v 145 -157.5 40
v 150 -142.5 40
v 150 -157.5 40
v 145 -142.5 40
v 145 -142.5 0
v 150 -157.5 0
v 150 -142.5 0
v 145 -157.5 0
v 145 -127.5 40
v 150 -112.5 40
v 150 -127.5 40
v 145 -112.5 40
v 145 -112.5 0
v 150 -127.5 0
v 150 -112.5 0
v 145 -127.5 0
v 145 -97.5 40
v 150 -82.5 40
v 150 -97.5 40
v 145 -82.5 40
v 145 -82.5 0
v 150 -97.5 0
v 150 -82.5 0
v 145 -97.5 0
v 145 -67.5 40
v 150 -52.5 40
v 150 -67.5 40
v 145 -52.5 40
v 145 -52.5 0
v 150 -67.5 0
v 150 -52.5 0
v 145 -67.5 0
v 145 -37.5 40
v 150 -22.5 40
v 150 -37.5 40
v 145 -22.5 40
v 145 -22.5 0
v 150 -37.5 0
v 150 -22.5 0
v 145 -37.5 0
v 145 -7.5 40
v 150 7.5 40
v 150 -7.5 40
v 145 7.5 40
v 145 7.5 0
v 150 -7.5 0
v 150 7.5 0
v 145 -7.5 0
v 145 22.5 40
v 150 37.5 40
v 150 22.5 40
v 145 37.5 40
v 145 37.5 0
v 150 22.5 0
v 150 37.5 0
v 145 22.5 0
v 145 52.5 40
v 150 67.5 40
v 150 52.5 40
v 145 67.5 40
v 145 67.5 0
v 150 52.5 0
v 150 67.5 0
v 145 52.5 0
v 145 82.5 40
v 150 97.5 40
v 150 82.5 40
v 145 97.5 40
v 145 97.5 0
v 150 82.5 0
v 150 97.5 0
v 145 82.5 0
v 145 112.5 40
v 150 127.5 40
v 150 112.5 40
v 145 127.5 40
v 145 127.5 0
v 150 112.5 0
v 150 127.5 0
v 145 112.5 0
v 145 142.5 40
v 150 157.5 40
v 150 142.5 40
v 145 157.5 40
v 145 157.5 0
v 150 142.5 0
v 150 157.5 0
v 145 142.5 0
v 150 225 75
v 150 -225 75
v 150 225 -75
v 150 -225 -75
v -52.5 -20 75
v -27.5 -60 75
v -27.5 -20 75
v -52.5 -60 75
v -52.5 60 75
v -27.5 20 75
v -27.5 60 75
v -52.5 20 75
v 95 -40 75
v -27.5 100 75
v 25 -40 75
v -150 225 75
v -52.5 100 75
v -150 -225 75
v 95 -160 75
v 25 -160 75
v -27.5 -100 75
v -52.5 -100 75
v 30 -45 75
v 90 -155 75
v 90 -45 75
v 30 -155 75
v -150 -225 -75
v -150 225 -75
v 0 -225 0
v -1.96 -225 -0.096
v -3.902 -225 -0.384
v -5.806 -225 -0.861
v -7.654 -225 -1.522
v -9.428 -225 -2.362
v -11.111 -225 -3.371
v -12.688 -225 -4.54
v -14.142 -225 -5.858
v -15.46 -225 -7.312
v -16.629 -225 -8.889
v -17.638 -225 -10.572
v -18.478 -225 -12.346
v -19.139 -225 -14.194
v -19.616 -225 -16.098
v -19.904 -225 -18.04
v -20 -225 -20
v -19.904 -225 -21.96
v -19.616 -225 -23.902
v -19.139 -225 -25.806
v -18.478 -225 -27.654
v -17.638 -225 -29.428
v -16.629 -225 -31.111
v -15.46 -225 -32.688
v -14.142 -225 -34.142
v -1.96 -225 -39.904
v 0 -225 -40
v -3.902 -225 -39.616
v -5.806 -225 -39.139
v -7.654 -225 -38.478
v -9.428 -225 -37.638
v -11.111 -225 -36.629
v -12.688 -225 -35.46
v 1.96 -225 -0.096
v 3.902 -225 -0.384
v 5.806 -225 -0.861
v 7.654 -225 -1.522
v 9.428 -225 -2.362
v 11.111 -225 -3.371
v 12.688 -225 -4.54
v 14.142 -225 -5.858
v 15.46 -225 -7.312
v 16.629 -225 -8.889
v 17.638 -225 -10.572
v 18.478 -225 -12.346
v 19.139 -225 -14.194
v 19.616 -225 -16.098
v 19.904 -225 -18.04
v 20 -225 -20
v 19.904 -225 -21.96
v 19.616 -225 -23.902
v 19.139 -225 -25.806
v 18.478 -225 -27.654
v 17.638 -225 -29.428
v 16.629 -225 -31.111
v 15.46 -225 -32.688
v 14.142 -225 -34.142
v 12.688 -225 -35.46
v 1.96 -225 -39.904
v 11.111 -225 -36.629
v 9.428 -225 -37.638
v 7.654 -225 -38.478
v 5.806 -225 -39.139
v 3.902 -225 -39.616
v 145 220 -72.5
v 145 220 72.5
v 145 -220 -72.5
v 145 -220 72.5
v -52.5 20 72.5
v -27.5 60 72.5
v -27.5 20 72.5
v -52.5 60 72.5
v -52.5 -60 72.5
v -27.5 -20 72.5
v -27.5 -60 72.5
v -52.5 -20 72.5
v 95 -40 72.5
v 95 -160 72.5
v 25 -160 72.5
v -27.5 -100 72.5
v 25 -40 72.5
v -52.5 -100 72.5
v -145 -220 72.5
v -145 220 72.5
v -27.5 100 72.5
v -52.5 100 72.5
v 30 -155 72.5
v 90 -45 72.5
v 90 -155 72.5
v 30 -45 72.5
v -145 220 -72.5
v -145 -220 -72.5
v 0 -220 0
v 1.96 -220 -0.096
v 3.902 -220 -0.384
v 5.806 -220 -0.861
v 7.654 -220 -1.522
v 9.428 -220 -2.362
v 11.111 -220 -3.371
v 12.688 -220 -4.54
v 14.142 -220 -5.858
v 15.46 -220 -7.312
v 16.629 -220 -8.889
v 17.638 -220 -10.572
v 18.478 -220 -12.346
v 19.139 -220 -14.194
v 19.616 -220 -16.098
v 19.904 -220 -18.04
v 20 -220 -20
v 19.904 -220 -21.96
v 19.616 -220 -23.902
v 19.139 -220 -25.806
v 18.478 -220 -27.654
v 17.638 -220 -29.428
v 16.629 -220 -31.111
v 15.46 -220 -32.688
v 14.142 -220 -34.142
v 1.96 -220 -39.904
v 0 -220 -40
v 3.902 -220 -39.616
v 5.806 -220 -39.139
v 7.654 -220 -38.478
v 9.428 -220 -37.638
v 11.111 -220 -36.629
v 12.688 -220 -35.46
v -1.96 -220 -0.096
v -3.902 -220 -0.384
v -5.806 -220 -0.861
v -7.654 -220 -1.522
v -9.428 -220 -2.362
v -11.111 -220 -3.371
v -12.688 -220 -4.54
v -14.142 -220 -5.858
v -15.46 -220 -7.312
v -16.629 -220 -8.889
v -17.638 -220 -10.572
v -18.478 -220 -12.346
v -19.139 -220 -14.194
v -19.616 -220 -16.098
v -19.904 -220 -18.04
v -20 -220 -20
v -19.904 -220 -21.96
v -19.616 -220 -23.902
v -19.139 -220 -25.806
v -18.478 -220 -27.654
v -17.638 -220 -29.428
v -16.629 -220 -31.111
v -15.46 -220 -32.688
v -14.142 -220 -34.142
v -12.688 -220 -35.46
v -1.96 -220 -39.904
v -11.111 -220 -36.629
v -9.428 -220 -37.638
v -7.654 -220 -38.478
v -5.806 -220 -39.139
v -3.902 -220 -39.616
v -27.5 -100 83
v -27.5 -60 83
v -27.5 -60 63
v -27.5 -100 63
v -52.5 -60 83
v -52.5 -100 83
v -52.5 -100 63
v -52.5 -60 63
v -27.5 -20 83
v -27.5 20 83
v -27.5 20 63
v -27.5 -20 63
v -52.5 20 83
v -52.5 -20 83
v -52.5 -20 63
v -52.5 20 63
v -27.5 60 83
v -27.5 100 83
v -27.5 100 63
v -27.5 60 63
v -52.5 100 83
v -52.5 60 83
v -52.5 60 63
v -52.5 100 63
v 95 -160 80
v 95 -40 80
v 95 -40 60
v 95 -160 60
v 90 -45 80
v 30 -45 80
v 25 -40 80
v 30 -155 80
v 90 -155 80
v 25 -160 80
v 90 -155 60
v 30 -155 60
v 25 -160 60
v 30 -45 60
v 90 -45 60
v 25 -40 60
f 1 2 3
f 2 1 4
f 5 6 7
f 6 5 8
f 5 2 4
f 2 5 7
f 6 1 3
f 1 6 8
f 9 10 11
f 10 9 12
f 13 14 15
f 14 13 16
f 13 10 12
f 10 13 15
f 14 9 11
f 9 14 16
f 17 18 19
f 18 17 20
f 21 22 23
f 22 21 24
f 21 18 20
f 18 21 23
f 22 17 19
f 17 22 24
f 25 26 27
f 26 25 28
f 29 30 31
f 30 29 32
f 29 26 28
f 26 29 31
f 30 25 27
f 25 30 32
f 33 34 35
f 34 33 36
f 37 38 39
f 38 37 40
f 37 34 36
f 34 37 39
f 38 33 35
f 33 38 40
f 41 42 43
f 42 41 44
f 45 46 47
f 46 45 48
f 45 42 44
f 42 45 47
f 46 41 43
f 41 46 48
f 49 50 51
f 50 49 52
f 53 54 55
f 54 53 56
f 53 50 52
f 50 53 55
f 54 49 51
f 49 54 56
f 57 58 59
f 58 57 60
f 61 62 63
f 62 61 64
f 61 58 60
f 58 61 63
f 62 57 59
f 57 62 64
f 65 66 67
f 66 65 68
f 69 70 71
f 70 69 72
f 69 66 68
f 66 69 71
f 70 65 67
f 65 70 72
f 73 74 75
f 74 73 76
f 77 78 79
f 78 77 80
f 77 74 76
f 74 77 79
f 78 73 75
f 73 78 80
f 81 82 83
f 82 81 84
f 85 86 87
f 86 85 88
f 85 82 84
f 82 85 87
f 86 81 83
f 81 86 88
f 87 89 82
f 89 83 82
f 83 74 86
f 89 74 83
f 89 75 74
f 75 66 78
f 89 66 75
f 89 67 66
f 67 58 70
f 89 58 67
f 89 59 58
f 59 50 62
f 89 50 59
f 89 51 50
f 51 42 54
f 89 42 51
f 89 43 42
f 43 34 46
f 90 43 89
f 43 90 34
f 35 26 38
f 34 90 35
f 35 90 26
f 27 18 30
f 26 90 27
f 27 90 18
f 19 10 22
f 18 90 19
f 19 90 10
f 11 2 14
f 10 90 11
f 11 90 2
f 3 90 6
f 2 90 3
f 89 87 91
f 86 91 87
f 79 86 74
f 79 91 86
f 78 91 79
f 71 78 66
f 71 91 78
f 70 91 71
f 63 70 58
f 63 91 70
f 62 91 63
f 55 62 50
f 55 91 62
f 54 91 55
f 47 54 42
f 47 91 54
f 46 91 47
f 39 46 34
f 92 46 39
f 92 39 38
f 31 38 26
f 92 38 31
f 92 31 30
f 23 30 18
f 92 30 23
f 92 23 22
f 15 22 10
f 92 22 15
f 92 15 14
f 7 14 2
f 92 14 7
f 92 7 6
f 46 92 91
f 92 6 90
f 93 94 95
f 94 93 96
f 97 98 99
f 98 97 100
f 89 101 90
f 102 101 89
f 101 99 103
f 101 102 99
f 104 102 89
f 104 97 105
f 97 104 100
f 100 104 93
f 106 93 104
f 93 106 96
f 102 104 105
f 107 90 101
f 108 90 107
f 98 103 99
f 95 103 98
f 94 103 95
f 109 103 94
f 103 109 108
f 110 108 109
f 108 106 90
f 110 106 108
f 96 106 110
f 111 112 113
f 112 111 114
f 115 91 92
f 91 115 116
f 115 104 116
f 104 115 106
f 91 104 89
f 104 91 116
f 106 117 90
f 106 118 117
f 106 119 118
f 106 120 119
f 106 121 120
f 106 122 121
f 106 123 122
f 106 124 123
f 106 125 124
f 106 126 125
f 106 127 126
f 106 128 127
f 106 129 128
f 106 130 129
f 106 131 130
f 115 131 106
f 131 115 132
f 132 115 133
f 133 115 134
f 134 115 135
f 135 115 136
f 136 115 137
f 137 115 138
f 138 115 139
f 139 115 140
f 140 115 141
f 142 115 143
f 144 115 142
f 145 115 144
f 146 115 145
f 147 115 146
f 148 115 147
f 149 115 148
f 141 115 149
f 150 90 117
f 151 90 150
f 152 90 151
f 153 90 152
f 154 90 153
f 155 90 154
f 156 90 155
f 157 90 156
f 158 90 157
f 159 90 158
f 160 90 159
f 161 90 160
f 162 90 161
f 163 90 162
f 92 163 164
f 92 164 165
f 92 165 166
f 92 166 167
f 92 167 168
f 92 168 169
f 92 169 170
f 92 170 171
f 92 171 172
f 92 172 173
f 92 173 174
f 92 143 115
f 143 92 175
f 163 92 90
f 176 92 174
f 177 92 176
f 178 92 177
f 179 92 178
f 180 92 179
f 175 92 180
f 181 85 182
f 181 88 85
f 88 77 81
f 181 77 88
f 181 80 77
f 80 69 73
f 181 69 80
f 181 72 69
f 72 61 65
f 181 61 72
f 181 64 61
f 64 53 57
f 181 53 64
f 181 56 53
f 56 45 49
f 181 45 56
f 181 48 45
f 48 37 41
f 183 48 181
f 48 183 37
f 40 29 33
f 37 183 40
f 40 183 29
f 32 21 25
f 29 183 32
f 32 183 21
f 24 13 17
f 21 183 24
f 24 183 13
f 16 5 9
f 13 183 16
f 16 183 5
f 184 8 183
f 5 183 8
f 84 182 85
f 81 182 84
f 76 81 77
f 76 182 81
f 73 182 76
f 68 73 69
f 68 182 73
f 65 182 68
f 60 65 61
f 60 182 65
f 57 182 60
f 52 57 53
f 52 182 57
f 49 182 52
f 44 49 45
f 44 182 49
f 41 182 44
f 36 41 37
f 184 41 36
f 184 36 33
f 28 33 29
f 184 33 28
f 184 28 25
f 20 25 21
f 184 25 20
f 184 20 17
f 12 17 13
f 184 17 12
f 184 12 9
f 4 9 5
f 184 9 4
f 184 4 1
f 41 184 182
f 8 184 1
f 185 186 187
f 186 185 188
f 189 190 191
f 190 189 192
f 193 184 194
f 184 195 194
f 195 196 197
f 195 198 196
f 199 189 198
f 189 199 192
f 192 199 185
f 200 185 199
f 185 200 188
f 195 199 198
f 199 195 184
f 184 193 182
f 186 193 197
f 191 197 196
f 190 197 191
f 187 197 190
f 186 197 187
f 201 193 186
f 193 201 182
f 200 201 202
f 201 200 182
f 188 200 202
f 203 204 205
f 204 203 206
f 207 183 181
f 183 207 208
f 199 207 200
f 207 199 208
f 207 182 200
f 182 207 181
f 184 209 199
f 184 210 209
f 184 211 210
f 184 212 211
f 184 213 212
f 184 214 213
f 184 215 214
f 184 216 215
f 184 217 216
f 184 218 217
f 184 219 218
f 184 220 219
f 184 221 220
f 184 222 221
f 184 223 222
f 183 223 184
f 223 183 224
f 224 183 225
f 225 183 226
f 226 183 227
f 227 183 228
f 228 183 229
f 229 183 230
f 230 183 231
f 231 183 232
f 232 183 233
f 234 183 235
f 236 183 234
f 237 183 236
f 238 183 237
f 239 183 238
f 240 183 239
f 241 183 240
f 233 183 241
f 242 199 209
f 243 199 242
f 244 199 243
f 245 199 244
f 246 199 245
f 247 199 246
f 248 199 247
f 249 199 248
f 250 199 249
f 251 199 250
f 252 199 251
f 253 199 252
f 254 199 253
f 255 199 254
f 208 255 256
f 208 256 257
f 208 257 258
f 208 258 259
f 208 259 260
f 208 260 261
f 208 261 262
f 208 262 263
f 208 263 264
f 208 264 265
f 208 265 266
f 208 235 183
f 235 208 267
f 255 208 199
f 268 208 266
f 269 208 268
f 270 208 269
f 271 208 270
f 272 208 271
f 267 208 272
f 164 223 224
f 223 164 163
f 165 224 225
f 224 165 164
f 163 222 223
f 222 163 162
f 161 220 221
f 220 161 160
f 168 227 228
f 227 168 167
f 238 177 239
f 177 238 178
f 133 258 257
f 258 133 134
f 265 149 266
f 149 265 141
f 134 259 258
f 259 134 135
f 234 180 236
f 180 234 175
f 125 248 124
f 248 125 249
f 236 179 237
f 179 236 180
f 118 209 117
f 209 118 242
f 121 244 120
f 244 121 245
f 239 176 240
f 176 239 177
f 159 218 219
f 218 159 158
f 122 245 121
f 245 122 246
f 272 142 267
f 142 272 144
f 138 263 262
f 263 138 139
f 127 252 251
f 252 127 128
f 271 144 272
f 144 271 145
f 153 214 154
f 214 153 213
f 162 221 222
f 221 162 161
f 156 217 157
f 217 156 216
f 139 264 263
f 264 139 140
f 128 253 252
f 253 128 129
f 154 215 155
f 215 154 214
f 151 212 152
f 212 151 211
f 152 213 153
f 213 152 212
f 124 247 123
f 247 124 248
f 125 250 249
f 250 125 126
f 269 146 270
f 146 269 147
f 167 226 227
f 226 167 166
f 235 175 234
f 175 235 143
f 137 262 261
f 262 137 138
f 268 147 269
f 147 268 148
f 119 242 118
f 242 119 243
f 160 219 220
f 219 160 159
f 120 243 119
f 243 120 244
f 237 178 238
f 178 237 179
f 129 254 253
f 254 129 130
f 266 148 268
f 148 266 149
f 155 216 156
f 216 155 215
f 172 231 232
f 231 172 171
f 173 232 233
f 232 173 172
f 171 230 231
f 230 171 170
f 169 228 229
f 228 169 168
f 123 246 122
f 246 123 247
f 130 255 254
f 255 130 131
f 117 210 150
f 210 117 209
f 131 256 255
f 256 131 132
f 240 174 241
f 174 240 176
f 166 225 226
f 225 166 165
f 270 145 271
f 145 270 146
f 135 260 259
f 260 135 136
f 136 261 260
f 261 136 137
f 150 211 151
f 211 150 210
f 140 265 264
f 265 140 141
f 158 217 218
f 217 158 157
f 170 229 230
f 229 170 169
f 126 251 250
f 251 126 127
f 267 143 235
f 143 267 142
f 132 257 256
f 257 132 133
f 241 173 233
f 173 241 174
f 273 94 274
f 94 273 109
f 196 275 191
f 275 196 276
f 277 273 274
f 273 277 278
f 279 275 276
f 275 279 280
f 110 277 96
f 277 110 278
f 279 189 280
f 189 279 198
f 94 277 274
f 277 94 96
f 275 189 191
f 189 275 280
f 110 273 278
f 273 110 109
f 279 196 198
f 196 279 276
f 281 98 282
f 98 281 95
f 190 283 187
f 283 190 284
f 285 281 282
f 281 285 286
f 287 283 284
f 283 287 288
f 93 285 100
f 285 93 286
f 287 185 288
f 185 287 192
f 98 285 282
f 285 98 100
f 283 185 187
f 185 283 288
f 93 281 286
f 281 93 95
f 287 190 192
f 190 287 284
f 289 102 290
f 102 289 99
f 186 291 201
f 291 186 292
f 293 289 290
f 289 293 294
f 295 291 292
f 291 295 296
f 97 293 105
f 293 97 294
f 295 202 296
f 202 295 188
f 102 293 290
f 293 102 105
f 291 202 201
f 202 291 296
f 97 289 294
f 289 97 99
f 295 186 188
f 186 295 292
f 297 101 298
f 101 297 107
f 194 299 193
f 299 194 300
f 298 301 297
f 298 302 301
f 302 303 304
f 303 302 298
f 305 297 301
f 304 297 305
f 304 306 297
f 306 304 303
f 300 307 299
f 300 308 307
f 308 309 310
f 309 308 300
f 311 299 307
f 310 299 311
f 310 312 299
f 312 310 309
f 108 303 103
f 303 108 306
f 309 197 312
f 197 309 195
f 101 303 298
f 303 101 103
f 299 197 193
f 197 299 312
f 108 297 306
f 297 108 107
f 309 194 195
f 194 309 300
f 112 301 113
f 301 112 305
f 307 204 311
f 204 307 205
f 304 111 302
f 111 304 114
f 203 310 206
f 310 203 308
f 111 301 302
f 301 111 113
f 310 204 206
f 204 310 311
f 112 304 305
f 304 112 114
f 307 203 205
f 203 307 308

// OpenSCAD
// =========================================================================
// GUNDAM ROBOTICS SYSTEMS - INDUSTRIAL BREAKER BOX ENCLOSURE
// WALL-MOUNTED INTERFACE FOR AUTO-RESTORING BEAM-SABER MAIN POWER
// =========================================================================

// Global Dimensions in Millimeters
BOX_WIDTH  = 300.0;
BOX_LENGTH = 450.0;
BOX_HEIGHT = 150.0;
WALL_THICK = 5.0; // Thick structural shielding

$fn = 64;

module main_panel_housing() {
    // Durable industrial carbon steel chassis frame
    color("DarkSlateGray", 0.9)
    difference() {
        // Core outer bounding volume
        cube([BOX_WIDTH, BOX_LENGTH, BOX_HEIGHT], center = true);
        
        // Hollow interior for routing boards and high-voltage switches
        cube([BOX_WIDTH - (2*WALL_THICK), BOX_LENGTH - (2*WALL_THICK), BOX_HEIGHT - WALL_THICK], center = true);
        
        // Heat Sink Ventilation Grills (Prevents air stagnation from optocouplers)
        for(y = [-150 : 30 : 150]) {
            translate([BOX_WIDTH/2 - 2, y, 20])
                cube([10, 15, 40], center = true);
        }
        
        // Main Conduit Knockout Outlets (For 480V direct line-feed input wires)
        translate([0, -BOX_LENGTH/2, -20])
            rotate([90, 0, 0])
                cylinder(h = 20, d = 40, center = true);
    }
}

module auto_restoring_breaker_switches() {
    // Three separate heavy-duty physical switch arrays for line protection
    color("Red", 1.0) {
        for(y = [-80, 0, 80]) {
            translate([-40, y, BOX_HEIGHT/2 - 2])
                cube([25, 40, 20], center = true);
        }
    }
}

module charging_cradle_interface_terminal() {
    // Heavily insulated terminal port to link the hilt's snap-circuit connector
    color("Black", 1.0)
    translate([60, -100, BOX_HEIGHT/2 - 5]) {
        difference() {
            cube([70, 120, 20], center = true);
            // Concave docking pocket for secure terminal locking
            cube([60, 110, 25], center = true);
        }
    }
}

// Composite Model Assembly Generation
module generate_complete_panel() {
    main_panel_housing();
    auto_restoring_breaker_switches();
    charging_cradle_interface_terminal();
}

generate_complete_panel();
